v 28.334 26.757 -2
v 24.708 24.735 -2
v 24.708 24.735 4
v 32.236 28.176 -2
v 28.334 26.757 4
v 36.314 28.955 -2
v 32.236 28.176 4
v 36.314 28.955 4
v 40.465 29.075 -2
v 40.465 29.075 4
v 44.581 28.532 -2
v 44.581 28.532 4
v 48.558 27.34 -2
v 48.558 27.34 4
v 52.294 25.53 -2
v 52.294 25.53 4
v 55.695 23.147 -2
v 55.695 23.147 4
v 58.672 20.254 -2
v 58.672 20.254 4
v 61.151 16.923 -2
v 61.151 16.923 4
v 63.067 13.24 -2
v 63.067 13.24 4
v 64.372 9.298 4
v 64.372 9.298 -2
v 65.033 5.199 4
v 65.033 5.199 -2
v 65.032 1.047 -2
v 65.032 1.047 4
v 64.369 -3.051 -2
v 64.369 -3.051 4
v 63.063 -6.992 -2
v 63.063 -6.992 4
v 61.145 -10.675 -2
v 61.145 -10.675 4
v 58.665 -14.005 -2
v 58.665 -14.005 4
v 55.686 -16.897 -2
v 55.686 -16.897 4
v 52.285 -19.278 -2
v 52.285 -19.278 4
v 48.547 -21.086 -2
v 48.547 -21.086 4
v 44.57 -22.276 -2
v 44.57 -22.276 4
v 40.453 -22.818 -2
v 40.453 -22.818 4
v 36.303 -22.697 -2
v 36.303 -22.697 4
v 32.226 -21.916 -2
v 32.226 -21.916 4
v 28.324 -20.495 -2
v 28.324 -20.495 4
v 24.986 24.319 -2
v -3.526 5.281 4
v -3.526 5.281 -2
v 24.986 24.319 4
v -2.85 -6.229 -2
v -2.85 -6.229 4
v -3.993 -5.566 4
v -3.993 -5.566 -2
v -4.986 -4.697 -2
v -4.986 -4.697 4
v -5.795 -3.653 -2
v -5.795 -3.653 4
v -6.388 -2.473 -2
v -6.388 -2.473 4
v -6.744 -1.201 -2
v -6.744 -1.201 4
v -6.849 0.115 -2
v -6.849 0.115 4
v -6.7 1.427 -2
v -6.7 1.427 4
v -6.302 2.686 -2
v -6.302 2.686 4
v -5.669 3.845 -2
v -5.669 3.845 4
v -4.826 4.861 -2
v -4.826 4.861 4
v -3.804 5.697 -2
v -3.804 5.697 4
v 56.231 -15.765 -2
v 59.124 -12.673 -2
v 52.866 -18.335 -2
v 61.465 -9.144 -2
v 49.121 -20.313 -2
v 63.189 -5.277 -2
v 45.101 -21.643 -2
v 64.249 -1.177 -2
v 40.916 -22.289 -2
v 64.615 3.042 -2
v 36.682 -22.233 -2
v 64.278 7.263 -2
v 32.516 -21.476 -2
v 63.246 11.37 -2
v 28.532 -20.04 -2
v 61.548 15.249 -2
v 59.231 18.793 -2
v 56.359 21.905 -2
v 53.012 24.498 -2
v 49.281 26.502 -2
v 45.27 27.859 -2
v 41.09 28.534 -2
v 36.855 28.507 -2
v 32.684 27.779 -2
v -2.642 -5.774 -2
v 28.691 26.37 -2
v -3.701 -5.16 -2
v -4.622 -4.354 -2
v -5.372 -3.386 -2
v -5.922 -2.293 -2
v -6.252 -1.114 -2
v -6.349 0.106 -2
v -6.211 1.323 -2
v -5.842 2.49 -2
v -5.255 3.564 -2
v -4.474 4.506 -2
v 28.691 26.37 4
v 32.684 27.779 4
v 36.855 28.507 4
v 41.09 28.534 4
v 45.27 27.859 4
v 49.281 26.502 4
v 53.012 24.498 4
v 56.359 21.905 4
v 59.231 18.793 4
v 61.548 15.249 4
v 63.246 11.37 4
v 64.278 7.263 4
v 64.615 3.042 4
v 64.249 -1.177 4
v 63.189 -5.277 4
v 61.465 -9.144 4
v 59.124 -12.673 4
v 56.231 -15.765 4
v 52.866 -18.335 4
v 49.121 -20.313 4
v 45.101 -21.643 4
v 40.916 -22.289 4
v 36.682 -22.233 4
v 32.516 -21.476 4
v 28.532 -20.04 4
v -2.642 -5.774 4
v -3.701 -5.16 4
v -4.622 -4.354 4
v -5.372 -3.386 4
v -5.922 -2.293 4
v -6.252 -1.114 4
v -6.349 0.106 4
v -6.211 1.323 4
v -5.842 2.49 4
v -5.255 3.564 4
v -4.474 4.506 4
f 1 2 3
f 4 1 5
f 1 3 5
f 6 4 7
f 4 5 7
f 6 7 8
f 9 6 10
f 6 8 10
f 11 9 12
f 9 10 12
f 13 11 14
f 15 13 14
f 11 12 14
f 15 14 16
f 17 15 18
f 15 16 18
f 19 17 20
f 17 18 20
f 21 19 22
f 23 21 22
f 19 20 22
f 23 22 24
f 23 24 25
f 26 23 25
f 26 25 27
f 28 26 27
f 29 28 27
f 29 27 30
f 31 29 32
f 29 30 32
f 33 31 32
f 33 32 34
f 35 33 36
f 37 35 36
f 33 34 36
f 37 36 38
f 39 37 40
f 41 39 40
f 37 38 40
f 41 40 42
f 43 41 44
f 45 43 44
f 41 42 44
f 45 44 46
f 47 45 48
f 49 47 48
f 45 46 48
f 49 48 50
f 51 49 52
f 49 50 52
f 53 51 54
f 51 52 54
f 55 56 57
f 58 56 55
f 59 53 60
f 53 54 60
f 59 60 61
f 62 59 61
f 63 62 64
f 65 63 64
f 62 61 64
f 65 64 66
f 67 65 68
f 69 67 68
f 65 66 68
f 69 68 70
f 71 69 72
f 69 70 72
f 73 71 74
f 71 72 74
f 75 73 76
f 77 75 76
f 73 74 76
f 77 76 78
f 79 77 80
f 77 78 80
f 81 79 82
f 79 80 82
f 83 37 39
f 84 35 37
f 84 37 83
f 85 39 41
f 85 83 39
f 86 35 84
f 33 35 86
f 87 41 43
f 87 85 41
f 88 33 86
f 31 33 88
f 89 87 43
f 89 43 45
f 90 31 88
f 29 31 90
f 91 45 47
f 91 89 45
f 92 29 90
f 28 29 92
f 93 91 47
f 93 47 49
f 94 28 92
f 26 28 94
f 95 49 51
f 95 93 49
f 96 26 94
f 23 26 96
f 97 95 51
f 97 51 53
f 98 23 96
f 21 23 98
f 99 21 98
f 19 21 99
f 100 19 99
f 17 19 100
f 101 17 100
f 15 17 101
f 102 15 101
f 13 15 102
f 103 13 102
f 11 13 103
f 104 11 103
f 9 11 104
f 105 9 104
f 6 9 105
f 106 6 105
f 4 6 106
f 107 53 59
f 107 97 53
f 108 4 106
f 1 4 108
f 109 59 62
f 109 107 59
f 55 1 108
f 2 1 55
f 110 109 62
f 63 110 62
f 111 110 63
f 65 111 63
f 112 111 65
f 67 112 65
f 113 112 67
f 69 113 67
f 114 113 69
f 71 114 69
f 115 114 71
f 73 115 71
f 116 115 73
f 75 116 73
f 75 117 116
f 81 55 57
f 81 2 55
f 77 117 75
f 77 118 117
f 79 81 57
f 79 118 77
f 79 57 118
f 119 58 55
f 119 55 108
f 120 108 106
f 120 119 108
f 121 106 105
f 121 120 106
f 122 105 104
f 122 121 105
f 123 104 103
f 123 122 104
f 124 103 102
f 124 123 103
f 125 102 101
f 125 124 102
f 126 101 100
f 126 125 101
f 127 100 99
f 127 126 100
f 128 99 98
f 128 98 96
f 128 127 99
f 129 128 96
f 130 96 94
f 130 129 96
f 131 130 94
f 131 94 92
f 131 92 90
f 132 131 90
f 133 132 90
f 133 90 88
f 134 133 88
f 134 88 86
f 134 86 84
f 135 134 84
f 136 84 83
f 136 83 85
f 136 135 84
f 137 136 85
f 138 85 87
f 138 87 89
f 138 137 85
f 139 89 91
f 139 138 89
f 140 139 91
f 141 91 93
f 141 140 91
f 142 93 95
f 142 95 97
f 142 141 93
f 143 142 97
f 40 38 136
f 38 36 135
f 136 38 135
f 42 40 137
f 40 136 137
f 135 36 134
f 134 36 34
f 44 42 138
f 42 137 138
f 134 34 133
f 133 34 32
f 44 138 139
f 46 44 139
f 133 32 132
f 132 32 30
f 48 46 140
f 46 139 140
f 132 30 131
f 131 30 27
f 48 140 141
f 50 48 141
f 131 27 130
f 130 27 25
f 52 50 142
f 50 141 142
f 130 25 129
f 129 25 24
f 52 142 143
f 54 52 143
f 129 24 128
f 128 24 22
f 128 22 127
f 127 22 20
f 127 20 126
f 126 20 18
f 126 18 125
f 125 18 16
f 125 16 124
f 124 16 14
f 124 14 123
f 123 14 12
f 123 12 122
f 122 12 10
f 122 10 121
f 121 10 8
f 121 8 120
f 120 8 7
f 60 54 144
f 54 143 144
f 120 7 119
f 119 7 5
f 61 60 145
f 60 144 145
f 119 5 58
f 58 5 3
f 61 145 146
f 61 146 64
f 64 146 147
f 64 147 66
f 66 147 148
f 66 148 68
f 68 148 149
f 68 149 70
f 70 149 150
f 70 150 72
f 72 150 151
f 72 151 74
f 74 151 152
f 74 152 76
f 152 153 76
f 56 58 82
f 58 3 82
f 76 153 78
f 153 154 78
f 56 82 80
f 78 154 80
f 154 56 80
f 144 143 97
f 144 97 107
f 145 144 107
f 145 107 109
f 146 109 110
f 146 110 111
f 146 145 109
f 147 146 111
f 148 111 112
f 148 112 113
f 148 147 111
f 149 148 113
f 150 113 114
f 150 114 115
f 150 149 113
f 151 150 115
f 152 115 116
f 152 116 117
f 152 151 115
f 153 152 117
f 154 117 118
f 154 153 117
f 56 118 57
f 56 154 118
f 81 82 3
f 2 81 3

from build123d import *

# Parameters (mm, degrees)
BOSS_EXTRUDE1_DEPTH      = 4
BOSS_EXTRUDE1_DEPTH_BACK = 2


with BuildPart() as part:
    # Sketch3 → Boss-Extrude1 (new body, two sides)
    with BuildSketch(Plane.XY) as boss_extrude1_sk:
        with BuildLine():
            Line((-3.803846336, 5.696775672), (24.708284265, 24.734871916))
            ThreePointArc((24.708284265, 24.734871916), (65.032506622, 5.199104), (28.324251817, -20.49512037))
            Line((28.324251817, -20.49512037), (-2.850444576, -6.228761171))
            ThreePointArc((-2.850444576, -6.228761171), (-6.828213831, -0.545889982), (-3.803846336, 5.696775672))
        make_face()
        with BuildLine():
            Line((-3.526193319, 5.28095263), (24.985937282, 24.319048874))
            ThreePointArc((24.985937282, 24.319048874), (64.534096854, 5.159258016), (28.532313465, -20.04046627))
            Line((28.532313465, -20.04046627), (-2.642382928, -5.774107071))
            ThreePointArc((-2.642382928, -5.774107071), (-6.329804063, -0.506043998), (-3.526193319, 5.28095263))
        make_face(mode=Mode.SUBTRACT)
    extrude(amount=BOSS_EXTRUDE1_DEPTH)
    extrude(boss_extrude1_sk.sketch, amount=-BOSS_EXTRUDE1_DEPTH_BACK)


solid = part.part
